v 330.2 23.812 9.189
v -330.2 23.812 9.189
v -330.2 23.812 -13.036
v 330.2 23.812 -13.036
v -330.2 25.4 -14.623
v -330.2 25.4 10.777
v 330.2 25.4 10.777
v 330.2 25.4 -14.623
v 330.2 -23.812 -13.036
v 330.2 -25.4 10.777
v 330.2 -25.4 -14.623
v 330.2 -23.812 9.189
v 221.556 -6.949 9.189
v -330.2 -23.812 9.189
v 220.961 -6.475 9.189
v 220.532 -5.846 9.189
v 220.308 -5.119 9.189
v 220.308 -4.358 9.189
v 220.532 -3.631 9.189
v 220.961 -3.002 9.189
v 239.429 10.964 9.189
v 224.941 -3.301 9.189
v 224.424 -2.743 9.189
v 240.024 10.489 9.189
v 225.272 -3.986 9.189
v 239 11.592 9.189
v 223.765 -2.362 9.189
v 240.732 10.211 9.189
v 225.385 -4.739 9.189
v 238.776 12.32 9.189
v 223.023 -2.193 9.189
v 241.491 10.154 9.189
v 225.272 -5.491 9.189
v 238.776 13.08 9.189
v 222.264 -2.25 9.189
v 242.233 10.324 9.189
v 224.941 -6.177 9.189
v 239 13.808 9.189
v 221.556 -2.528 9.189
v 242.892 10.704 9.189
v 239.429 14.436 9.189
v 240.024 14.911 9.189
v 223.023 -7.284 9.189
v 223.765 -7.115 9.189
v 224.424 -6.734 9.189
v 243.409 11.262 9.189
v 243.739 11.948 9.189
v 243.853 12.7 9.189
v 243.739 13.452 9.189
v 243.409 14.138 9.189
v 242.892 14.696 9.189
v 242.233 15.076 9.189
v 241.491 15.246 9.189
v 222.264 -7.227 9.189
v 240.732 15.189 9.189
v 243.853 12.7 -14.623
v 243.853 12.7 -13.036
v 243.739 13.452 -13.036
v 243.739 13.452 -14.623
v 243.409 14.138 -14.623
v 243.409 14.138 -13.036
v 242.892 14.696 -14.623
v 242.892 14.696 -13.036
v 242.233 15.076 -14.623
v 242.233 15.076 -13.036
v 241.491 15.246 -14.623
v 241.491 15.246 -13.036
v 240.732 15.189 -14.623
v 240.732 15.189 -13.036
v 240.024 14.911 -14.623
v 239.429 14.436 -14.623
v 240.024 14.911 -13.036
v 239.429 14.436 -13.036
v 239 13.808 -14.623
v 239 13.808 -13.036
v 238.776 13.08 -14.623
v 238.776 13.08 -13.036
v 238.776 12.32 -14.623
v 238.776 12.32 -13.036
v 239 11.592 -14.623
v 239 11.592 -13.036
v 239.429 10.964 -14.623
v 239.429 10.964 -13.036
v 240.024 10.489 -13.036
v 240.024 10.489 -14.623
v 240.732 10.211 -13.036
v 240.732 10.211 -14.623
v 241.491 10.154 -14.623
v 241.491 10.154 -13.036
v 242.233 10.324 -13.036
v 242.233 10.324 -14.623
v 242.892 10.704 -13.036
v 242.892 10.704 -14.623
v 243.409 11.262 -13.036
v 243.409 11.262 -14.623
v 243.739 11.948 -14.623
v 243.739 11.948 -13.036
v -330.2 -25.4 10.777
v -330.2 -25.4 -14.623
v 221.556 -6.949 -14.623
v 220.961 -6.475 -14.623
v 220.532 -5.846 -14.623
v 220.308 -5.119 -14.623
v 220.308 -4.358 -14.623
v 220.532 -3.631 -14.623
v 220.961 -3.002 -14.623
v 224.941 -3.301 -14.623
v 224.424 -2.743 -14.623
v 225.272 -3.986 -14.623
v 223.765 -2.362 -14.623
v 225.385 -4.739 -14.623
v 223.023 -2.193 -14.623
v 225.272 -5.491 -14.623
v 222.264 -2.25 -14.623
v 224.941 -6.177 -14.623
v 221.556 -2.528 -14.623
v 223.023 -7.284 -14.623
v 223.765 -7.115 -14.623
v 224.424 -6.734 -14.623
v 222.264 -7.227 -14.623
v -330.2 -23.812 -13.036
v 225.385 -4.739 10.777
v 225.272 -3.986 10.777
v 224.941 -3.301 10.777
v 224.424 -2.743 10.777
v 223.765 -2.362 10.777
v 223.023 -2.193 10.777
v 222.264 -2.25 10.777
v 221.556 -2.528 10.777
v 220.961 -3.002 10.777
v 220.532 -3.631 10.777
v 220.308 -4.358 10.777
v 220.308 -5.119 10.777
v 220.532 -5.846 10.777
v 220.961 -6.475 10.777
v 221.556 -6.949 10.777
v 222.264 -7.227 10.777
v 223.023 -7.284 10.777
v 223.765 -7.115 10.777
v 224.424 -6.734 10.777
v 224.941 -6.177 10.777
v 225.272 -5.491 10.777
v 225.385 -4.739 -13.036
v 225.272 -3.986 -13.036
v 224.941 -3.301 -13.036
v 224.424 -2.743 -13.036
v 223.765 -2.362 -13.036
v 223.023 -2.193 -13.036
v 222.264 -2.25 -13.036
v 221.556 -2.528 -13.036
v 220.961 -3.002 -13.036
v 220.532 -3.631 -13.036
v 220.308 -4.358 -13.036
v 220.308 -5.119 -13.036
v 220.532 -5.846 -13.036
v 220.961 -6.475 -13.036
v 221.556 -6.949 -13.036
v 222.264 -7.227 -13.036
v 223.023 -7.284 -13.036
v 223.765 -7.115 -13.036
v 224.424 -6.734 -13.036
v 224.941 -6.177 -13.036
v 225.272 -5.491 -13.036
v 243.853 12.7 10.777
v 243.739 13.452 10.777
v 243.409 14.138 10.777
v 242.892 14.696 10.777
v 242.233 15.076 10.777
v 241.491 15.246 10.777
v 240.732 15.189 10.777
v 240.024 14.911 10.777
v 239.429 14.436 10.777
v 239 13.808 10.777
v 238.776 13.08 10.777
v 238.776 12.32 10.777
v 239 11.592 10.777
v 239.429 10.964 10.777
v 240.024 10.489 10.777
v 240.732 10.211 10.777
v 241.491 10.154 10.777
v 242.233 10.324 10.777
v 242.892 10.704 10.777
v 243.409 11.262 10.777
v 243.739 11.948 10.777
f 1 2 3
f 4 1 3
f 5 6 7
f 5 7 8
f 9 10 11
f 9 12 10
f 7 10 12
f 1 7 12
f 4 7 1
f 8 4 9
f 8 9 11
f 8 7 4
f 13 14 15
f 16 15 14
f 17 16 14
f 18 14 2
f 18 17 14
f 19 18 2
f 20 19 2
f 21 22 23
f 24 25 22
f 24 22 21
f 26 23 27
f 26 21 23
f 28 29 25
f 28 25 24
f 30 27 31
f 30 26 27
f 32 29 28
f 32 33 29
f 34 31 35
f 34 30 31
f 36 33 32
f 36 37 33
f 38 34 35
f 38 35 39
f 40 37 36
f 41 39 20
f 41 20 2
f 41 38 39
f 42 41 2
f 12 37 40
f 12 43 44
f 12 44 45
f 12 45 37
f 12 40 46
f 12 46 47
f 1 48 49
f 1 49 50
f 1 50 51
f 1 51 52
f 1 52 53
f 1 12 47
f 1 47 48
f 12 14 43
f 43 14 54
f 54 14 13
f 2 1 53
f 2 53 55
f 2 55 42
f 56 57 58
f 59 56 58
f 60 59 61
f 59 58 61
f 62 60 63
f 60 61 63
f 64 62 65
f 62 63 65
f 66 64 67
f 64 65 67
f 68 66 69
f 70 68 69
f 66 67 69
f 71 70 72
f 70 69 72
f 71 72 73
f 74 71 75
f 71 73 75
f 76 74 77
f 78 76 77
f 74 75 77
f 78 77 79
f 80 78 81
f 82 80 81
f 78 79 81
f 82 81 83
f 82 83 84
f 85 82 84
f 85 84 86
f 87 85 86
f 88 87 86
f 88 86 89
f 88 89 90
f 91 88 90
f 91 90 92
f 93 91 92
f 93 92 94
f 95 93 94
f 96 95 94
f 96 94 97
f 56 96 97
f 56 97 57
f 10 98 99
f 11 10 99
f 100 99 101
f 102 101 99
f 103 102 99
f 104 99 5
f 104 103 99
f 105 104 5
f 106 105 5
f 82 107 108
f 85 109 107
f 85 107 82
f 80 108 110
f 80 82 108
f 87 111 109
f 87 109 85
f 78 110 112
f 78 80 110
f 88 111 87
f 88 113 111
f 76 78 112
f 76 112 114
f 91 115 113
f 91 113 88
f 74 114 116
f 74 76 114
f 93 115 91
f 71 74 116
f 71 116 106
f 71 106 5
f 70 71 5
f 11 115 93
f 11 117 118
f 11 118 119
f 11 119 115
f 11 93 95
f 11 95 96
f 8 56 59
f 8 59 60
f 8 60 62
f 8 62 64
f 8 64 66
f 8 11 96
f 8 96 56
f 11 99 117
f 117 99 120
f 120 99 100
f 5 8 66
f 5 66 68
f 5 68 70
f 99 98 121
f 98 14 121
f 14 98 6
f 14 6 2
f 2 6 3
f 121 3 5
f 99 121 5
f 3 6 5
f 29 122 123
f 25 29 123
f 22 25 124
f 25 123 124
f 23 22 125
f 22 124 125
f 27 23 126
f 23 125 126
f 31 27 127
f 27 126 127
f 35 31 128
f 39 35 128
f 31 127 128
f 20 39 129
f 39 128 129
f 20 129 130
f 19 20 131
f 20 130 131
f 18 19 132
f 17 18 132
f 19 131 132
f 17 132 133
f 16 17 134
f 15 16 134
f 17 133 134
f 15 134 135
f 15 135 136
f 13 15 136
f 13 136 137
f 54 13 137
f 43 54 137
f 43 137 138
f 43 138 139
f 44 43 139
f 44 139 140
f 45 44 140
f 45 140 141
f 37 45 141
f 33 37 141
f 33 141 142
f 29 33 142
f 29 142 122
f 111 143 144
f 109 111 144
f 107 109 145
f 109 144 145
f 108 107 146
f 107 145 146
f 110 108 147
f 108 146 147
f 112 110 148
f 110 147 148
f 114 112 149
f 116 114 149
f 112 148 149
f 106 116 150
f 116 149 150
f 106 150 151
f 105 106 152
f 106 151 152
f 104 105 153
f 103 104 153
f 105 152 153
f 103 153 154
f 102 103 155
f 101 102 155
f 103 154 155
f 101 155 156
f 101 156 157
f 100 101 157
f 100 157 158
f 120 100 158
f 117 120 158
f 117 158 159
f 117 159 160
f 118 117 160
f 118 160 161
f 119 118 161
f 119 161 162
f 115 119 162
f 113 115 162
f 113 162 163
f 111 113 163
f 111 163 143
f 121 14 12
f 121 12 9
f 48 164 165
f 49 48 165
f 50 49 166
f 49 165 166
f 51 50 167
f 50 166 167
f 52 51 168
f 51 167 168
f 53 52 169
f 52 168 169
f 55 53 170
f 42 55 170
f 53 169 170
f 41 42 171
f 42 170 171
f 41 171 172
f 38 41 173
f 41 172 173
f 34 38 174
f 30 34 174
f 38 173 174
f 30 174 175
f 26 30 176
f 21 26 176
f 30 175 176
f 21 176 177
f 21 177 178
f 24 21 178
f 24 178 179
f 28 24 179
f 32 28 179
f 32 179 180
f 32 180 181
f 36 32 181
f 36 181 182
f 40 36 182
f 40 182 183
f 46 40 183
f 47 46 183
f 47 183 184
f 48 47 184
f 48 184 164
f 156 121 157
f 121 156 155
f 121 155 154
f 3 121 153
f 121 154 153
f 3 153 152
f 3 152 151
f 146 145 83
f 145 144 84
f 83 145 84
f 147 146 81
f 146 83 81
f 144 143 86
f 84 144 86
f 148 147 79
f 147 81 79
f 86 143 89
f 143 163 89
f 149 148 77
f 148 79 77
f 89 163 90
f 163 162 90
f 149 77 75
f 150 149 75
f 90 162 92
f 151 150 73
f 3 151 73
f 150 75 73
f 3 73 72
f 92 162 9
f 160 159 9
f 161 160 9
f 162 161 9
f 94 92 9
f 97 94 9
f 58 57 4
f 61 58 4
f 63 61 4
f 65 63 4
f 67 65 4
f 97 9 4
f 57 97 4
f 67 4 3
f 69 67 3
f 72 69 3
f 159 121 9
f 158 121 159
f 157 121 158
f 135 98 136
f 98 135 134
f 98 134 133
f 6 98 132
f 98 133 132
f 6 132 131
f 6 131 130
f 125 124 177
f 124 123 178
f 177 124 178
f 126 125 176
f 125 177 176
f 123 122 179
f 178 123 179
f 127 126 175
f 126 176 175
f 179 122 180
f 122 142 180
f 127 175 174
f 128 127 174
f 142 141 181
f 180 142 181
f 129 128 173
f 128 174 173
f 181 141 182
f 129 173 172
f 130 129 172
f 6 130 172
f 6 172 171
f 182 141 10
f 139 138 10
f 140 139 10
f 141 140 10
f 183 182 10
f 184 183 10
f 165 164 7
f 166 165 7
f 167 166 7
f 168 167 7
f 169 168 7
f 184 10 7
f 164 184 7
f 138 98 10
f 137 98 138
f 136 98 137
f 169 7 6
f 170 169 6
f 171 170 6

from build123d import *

# Parameters (mm, degrees)
SKETCH1_W              = 25.4
SKETCH1_H              = 50.8
SKETCH1_W_2            = 22.225
SKETCH1_H_2            = 47.625
BOSS_EXTRUDE1_DEPTH    = 330.2
F_10_CLEARANCE_HOLE1_D = 5.1054


with BuildPart() as part:
    # Sketch1 → Boss-Extrude1 (new, symmetric)
    with BuildSketch(Plane(origin=(0, 0, 0), x_dir=(0, 0, -1), z_dir=(1, 0, 0))):
        with Locations((1.923003206, 0)):
            Rectangle(SKETCH1_W, SKETCH1_H)
        with Locations((1.923003206, 0)):
            Rectangle(SKETCH1_W_2, SKETCH1_H_2, mode=Mode.SUBTRACT)
    extrude(amount=BOSS_EXTRUDE1_DEPTH, both=True)

    # #10 Clearance Hole1 (through all)
    with Locations(Plane(origin=(0, 0, -14.623003206), x_dir=(-1, 0, 0), z_dir=(0, 0, -1))):
        with Locations((-241.3, 12.7), (-222.832275442, -4.738553542)):
            Hole(F_10_CLEARANCE_HOLE1_D / 2)


solid = part.part
